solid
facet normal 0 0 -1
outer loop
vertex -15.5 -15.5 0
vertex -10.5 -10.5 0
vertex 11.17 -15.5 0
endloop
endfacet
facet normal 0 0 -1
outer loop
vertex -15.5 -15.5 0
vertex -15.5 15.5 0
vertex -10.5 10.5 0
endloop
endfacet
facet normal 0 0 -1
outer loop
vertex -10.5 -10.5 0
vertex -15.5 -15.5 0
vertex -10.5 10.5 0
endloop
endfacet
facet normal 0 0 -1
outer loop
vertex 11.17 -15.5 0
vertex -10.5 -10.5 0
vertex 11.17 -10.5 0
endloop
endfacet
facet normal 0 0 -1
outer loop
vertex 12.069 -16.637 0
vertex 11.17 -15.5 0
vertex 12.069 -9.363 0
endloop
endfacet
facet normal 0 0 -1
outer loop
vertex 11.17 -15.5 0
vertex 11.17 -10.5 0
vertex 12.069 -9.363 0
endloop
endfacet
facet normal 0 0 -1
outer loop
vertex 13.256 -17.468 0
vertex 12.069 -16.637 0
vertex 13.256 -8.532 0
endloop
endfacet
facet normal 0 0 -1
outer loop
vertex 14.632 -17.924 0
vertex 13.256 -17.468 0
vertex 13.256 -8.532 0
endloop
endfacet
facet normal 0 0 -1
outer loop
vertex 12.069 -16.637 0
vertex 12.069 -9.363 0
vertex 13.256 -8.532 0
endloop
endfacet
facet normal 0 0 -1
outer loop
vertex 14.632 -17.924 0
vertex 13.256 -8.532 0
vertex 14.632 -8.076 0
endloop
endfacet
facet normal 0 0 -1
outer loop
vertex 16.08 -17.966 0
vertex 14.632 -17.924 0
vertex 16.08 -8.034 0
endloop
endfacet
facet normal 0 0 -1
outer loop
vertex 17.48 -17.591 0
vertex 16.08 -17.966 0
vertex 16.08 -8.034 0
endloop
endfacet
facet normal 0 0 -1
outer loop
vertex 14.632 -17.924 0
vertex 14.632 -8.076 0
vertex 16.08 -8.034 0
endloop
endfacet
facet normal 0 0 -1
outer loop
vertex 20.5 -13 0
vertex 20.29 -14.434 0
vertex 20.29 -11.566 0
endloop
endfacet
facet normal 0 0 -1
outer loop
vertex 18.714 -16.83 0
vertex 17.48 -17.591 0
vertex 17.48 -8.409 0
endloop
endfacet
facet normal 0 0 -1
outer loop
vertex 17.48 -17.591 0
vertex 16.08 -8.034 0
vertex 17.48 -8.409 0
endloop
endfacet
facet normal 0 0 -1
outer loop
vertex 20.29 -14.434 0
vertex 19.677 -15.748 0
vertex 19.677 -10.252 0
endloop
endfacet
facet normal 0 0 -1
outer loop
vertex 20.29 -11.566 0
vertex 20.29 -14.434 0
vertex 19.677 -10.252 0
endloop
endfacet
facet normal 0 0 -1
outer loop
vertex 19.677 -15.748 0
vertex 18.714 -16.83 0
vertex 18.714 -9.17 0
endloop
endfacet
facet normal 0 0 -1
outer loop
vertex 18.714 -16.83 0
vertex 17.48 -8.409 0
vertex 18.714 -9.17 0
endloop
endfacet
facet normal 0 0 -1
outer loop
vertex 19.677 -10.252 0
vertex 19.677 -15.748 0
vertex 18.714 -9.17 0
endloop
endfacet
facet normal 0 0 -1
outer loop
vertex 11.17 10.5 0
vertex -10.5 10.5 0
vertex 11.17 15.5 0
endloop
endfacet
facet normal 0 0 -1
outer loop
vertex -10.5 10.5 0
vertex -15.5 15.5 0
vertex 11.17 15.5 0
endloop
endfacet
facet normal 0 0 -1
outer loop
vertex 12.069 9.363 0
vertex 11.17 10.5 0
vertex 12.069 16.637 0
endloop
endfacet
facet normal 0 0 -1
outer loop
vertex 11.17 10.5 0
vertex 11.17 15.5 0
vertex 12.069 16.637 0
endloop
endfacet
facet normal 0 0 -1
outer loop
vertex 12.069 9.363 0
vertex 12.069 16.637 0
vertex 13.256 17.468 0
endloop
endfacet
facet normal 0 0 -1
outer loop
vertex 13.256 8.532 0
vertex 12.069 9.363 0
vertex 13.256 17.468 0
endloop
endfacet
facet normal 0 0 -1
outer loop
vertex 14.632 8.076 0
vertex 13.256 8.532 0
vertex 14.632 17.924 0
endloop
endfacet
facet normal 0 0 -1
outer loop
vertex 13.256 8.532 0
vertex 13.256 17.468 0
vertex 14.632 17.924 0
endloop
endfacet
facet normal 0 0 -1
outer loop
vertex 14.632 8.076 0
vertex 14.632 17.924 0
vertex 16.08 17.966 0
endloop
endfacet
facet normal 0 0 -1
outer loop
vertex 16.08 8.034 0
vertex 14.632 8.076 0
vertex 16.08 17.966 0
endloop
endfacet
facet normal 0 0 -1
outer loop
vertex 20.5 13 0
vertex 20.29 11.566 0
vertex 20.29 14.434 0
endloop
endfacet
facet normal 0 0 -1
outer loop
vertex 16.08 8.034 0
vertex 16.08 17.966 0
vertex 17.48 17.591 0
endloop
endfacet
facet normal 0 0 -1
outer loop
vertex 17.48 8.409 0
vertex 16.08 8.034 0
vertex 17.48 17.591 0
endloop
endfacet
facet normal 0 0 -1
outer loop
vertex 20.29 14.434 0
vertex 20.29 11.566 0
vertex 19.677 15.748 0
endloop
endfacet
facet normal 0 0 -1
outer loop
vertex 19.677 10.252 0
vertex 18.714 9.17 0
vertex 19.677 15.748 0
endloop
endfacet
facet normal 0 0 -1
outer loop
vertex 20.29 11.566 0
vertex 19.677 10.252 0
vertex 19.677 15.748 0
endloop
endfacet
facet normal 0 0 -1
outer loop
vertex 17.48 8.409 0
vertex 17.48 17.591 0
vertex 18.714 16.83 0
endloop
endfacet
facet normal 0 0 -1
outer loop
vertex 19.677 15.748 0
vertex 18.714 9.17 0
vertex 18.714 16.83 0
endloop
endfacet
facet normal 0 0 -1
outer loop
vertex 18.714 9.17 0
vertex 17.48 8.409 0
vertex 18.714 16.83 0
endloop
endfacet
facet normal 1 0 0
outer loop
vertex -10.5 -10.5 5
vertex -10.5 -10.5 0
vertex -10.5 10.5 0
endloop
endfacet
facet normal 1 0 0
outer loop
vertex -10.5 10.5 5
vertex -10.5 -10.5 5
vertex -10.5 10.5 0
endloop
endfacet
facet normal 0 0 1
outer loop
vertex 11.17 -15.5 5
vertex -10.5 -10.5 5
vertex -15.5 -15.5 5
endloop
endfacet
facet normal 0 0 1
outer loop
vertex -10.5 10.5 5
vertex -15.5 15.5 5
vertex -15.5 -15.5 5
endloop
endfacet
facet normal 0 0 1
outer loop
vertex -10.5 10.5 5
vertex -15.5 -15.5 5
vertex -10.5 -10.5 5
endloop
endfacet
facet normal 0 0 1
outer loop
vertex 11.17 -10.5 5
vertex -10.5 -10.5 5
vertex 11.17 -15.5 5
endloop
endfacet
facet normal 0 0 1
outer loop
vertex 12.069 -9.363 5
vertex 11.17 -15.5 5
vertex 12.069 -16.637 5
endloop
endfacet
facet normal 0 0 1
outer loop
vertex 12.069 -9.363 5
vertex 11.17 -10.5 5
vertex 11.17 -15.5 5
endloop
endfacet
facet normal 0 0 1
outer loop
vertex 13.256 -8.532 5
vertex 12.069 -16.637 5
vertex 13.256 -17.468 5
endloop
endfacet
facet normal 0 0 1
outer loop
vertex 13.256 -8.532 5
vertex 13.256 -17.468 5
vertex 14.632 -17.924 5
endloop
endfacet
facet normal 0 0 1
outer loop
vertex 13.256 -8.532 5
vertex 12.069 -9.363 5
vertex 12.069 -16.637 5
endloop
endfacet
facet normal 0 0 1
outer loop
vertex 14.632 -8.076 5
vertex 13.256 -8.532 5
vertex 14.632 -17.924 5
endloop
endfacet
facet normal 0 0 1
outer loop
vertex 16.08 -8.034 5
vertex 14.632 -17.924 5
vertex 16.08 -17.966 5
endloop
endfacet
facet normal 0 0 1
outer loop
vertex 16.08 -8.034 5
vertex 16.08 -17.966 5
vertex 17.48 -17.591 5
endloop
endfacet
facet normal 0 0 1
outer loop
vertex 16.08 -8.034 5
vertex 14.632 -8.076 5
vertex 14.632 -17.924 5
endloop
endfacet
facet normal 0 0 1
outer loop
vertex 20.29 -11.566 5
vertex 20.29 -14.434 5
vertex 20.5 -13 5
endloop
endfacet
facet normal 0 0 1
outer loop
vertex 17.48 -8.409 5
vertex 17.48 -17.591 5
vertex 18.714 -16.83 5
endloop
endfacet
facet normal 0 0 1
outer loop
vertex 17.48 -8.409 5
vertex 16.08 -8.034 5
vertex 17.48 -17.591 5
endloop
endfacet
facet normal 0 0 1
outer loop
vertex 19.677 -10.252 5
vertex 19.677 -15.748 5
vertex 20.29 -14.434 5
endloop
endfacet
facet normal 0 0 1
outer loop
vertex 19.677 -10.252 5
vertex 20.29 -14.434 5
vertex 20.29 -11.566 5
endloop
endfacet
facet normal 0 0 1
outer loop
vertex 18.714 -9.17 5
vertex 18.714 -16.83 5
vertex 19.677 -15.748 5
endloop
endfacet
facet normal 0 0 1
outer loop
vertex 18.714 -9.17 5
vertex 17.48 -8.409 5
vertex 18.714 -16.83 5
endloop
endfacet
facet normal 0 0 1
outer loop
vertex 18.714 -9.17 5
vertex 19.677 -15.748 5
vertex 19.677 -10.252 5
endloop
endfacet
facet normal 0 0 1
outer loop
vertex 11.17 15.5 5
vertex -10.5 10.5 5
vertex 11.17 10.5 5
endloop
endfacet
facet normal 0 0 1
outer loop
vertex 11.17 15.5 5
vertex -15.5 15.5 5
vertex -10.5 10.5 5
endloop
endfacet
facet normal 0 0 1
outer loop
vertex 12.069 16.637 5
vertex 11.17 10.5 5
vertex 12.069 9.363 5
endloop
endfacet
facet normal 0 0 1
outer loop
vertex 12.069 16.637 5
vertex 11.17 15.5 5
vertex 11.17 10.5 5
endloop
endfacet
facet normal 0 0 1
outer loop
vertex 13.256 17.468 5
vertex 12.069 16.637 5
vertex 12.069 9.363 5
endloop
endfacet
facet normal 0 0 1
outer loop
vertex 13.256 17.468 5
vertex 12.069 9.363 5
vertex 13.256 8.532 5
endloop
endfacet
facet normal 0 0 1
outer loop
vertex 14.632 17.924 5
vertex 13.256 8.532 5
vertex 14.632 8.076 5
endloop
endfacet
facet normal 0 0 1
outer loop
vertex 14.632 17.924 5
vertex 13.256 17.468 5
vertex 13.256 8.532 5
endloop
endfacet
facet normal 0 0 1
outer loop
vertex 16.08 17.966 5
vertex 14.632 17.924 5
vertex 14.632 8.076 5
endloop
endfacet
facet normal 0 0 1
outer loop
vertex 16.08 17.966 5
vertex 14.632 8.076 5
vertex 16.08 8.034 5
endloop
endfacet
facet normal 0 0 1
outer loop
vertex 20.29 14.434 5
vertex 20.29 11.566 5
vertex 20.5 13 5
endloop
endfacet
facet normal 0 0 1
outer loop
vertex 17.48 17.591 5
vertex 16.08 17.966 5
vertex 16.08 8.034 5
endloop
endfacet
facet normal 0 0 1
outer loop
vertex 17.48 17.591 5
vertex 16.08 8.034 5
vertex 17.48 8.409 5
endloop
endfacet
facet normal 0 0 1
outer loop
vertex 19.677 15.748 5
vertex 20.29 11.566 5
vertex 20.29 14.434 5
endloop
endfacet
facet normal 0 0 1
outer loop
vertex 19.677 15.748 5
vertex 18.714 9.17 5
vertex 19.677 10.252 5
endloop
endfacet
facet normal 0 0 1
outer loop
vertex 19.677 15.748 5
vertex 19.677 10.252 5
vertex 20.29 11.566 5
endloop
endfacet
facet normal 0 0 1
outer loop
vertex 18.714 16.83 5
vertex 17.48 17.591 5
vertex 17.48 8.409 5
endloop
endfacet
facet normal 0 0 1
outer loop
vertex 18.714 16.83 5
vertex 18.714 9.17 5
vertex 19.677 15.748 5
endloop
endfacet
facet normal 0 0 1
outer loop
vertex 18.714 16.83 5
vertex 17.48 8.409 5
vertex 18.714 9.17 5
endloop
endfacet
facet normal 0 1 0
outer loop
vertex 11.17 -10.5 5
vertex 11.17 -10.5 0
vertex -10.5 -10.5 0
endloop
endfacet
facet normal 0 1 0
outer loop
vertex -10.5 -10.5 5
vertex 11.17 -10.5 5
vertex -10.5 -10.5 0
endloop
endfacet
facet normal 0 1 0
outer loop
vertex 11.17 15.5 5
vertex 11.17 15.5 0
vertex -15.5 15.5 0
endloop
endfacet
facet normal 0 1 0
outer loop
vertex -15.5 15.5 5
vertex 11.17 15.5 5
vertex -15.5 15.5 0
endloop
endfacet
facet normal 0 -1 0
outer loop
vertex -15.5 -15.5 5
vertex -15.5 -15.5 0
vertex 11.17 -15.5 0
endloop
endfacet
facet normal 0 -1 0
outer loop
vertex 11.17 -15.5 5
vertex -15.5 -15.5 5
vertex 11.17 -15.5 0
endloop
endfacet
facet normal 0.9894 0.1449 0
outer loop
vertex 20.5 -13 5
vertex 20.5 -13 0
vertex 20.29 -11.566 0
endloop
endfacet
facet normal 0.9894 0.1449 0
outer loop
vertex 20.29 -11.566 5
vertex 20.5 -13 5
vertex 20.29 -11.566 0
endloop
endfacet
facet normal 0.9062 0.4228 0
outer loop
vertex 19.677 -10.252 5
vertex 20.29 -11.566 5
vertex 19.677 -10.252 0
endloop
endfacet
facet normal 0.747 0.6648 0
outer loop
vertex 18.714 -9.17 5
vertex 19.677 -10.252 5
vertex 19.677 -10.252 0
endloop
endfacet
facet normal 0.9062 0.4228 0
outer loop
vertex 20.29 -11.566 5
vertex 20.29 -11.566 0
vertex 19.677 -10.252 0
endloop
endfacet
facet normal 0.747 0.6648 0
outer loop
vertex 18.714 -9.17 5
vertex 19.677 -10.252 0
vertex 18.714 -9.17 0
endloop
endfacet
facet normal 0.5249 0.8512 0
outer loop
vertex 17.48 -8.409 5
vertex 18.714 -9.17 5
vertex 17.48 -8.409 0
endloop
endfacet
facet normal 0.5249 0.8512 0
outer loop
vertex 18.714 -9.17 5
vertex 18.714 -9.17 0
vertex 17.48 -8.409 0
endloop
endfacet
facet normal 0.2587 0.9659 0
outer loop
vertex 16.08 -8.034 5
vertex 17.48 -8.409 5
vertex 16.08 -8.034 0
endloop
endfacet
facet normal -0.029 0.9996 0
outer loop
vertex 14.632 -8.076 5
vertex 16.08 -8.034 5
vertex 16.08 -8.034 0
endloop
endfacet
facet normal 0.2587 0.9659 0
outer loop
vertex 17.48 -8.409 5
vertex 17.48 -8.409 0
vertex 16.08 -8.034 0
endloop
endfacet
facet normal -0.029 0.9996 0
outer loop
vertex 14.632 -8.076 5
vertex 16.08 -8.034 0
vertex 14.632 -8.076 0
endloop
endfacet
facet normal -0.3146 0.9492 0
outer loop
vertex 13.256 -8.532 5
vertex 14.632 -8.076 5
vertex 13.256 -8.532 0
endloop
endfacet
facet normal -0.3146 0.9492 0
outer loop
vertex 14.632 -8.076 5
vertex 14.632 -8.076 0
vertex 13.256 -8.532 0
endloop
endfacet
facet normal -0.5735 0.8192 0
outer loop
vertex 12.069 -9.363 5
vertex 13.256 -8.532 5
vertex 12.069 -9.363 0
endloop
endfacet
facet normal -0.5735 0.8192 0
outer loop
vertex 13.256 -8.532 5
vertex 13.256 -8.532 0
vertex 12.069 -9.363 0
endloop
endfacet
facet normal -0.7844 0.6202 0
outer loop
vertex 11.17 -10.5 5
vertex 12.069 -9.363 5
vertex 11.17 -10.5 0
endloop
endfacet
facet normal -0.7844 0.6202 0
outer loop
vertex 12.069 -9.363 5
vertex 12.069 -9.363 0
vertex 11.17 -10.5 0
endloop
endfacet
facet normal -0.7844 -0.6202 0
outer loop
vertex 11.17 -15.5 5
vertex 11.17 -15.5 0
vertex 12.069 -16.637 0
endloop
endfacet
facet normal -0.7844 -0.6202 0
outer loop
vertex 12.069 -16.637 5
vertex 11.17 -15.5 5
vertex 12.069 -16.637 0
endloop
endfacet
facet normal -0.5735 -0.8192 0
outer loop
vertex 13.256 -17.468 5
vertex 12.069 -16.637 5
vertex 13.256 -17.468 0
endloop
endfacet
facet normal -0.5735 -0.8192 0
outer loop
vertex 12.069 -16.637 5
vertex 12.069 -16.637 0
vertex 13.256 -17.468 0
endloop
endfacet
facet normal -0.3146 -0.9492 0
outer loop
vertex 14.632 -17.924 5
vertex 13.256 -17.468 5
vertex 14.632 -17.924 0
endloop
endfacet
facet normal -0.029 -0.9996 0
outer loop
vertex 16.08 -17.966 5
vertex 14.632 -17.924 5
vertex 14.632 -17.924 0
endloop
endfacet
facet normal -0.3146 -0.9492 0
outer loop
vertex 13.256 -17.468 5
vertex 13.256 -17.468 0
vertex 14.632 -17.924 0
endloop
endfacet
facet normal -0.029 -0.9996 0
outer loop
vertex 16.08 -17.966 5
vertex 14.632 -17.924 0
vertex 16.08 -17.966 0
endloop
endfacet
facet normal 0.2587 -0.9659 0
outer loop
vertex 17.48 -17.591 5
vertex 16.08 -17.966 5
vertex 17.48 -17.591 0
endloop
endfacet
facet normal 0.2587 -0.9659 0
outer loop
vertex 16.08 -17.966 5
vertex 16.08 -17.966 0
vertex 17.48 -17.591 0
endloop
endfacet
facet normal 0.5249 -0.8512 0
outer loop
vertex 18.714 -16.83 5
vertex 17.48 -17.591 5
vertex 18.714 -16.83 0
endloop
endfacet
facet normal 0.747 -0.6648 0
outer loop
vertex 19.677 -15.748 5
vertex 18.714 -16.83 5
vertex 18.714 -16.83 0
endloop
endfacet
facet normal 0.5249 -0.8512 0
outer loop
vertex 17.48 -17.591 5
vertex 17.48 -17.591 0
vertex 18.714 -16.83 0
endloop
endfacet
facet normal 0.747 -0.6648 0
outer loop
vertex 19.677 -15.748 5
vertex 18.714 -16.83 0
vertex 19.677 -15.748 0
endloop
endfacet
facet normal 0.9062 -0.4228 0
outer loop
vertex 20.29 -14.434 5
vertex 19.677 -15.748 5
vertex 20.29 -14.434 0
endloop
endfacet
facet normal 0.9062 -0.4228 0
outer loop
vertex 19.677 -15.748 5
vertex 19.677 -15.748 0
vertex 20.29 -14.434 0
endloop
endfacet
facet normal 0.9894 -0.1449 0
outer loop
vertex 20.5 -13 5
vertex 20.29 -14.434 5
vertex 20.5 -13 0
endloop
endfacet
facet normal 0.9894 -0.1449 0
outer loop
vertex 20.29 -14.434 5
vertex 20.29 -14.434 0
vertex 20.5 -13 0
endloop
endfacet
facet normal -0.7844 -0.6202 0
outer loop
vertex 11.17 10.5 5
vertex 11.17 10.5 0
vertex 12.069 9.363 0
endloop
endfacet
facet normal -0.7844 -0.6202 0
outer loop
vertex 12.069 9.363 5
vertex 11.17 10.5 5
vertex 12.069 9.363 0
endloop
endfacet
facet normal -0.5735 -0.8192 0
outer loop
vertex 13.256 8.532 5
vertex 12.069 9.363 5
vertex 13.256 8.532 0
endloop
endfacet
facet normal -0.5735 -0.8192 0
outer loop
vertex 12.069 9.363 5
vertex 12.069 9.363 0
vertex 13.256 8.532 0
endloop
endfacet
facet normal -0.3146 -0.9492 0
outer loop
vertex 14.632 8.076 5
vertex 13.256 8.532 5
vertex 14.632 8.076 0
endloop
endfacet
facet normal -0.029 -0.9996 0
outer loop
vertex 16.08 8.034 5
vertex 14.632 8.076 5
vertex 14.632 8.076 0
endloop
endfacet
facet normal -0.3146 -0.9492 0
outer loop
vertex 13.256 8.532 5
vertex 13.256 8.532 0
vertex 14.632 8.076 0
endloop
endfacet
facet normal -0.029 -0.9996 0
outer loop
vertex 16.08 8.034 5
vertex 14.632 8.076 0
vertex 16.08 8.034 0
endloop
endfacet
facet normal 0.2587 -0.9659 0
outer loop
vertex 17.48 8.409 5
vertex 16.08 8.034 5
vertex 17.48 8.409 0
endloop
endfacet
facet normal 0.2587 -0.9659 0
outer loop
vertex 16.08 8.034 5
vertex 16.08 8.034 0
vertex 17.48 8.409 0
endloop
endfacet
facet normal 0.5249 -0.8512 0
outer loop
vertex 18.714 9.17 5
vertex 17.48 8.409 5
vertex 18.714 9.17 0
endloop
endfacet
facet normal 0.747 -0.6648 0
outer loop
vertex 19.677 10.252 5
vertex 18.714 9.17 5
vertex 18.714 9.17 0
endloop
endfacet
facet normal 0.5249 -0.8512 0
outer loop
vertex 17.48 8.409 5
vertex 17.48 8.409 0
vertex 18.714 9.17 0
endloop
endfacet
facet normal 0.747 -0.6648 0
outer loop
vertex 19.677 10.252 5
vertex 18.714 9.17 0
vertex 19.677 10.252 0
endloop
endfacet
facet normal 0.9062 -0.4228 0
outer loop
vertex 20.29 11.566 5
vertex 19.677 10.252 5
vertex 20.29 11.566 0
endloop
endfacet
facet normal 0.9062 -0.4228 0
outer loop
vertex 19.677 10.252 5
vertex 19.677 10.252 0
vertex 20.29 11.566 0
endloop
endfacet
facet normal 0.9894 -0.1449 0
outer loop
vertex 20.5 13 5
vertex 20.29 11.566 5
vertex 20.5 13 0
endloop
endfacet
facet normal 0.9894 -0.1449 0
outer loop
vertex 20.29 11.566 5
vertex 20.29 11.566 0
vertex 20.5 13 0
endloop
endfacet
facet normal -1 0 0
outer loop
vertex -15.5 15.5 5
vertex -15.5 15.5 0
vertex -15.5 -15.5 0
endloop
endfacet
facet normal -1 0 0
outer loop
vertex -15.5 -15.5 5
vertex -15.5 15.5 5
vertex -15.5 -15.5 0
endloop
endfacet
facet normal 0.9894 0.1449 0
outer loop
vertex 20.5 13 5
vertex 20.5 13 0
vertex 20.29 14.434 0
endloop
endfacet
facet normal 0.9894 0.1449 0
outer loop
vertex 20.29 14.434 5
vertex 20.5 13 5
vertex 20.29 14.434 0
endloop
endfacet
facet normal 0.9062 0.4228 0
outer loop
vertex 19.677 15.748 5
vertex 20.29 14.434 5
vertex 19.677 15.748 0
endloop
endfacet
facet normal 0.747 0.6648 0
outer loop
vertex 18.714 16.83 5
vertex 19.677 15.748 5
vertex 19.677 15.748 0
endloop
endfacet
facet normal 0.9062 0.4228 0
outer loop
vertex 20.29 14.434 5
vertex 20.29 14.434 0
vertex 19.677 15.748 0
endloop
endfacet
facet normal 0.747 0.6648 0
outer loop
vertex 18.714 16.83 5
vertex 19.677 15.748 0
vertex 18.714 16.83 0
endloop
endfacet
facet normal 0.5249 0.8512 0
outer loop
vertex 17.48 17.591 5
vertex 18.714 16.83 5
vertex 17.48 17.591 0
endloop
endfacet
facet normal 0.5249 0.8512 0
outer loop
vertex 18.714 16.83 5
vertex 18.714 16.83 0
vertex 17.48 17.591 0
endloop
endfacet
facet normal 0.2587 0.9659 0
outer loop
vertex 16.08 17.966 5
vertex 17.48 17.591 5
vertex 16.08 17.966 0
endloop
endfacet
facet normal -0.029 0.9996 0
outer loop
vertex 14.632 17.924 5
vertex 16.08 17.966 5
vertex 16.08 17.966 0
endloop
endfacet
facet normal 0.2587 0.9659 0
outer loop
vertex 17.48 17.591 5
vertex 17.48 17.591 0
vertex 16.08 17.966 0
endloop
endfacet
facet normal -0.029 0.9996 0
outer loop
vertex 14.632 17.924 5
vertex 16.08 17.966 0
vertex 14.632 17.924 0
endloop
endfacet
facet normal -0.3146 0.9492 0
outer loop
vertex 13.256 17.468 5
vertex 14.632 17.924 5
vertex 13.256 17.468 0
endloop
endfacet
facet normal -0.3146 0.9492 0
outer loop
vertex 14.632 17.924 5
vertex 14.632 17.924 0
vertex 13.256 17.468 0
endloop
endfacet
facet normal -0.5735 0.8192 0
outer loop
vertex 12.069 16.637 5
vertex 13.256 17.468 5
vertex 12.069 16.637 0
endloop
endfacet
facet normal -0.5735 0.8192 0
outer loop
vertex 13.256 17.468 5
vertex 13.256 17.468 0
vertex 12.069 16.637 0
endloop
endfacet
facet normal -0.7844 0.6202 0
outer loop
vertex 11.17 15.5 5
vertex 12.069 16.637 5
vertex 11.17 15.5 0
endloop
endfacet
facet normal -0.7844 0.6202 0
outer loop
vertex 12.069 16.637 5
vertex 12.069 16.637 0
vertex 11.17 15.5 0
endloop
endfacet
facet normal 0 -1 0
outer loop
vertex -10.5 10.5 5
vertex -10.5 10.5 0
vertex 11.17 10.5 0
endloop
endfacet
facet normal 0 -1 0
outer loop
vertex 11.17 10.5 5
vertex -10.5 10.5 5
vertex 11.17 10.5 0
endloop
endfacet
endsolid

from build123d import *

# Parameters (mm, degrees)
F2_DEPTH = 5


with BuildPart() as f2:
    # F1 (on Top) → F2 (new body)
    with BuildSketch(Plane.XY):
        Polygon((-10.5, -10.5), (-10.5, 10.5), (-15.5, 10.5), (-15.5, -15.5), (-10.5, -15.5), align=None)
        with BuildLine():
            Line((-10.5, 10.5), (10.5, 10.5))
            Line((10.5, 10.5), (11.1698729811, 10.5))
            ThreePointArc((11.1698729811, 10.5), (10.5, 13), (11.1698729811, 15.5))
            Line((11.1698729811, 15.5), (-15.5, 15.5))
            Line((-15.5, 15.5), (-15.5, 10.5))
            Line((-15.5, 10.5), (-10.5, 10.5))
        make_face()
        with BuildLine():
            ThreePointArc((11.1698729811, 15.5), (10.5, 13), (11.1698729811, 10.5))
            Line((11.1698729811, 10.5), (15.5, 10.5))
            Line((15.5, 10.5), (15.5, 15.5))
            Line((15.5, 15.5), (11.1698729811, 15.5))
        make_face()
        with BuildLine():
            Line((15.5, 10.5), (11.1698729811, 10.5))
            ThreePointArc((11.1698729811, 10.5), (16.7940952255, 8.1703708686), (20.5, 13))
            ThreePointArc((20.5, 13), (16.7940952255, 17.8296291314), (11.1698729811, 15.5))
            Line((11.1698729811, 15.5), (15.5, 15.5))
            Line((15.5, 15.5), (15.5, 10.5))
        make_face()
        with BuildLine():
            Line((11.1698729811, -10.5), (10.5, -10.5))
            Line((10.5, -10.5), (-10.5, -10.5))
            Line((-10.5, -10.5), (-10.5, -15.5))
            Line((-10.5, -15.5), (11.1698729811, -15.5))
            ThreePointArc((11.1698729811, -15.5), (10.5, -13), (11.1698729811, -10.5))
        make_face()
        with BuildLine():
            Line((15.5, -10.5), (11.1698729811, -10.5))
            ThreePointArc((11.1698729811, -10.5), (10.5, -13), (11.1698729811, -15.5))
            Line((11.1698729811, -15.5), (15.5, -15.5))
            Line((15.5, -15.5), (15.5, -10.5))
        make_face()
        with BuildLine():
            ThreePointArc((20.5, -13), (16.7940952255, -8.1703708686), (11.1698729811, -10.5))
            Line((11.1698729811, -10.5), (15.5, -10.5))
            Line((15.5, -10.5), (15.5, -15.5))
            Line((15.5, -15.5), (11.1698729811, -15.5))
            ThreePointArc((11.1698729811, -15.5), (16.7940952255, -17.8296291314), (20.5, -13))
        make_face()
    extrude(amount=F2_DEPTH)


solid = f2.part
